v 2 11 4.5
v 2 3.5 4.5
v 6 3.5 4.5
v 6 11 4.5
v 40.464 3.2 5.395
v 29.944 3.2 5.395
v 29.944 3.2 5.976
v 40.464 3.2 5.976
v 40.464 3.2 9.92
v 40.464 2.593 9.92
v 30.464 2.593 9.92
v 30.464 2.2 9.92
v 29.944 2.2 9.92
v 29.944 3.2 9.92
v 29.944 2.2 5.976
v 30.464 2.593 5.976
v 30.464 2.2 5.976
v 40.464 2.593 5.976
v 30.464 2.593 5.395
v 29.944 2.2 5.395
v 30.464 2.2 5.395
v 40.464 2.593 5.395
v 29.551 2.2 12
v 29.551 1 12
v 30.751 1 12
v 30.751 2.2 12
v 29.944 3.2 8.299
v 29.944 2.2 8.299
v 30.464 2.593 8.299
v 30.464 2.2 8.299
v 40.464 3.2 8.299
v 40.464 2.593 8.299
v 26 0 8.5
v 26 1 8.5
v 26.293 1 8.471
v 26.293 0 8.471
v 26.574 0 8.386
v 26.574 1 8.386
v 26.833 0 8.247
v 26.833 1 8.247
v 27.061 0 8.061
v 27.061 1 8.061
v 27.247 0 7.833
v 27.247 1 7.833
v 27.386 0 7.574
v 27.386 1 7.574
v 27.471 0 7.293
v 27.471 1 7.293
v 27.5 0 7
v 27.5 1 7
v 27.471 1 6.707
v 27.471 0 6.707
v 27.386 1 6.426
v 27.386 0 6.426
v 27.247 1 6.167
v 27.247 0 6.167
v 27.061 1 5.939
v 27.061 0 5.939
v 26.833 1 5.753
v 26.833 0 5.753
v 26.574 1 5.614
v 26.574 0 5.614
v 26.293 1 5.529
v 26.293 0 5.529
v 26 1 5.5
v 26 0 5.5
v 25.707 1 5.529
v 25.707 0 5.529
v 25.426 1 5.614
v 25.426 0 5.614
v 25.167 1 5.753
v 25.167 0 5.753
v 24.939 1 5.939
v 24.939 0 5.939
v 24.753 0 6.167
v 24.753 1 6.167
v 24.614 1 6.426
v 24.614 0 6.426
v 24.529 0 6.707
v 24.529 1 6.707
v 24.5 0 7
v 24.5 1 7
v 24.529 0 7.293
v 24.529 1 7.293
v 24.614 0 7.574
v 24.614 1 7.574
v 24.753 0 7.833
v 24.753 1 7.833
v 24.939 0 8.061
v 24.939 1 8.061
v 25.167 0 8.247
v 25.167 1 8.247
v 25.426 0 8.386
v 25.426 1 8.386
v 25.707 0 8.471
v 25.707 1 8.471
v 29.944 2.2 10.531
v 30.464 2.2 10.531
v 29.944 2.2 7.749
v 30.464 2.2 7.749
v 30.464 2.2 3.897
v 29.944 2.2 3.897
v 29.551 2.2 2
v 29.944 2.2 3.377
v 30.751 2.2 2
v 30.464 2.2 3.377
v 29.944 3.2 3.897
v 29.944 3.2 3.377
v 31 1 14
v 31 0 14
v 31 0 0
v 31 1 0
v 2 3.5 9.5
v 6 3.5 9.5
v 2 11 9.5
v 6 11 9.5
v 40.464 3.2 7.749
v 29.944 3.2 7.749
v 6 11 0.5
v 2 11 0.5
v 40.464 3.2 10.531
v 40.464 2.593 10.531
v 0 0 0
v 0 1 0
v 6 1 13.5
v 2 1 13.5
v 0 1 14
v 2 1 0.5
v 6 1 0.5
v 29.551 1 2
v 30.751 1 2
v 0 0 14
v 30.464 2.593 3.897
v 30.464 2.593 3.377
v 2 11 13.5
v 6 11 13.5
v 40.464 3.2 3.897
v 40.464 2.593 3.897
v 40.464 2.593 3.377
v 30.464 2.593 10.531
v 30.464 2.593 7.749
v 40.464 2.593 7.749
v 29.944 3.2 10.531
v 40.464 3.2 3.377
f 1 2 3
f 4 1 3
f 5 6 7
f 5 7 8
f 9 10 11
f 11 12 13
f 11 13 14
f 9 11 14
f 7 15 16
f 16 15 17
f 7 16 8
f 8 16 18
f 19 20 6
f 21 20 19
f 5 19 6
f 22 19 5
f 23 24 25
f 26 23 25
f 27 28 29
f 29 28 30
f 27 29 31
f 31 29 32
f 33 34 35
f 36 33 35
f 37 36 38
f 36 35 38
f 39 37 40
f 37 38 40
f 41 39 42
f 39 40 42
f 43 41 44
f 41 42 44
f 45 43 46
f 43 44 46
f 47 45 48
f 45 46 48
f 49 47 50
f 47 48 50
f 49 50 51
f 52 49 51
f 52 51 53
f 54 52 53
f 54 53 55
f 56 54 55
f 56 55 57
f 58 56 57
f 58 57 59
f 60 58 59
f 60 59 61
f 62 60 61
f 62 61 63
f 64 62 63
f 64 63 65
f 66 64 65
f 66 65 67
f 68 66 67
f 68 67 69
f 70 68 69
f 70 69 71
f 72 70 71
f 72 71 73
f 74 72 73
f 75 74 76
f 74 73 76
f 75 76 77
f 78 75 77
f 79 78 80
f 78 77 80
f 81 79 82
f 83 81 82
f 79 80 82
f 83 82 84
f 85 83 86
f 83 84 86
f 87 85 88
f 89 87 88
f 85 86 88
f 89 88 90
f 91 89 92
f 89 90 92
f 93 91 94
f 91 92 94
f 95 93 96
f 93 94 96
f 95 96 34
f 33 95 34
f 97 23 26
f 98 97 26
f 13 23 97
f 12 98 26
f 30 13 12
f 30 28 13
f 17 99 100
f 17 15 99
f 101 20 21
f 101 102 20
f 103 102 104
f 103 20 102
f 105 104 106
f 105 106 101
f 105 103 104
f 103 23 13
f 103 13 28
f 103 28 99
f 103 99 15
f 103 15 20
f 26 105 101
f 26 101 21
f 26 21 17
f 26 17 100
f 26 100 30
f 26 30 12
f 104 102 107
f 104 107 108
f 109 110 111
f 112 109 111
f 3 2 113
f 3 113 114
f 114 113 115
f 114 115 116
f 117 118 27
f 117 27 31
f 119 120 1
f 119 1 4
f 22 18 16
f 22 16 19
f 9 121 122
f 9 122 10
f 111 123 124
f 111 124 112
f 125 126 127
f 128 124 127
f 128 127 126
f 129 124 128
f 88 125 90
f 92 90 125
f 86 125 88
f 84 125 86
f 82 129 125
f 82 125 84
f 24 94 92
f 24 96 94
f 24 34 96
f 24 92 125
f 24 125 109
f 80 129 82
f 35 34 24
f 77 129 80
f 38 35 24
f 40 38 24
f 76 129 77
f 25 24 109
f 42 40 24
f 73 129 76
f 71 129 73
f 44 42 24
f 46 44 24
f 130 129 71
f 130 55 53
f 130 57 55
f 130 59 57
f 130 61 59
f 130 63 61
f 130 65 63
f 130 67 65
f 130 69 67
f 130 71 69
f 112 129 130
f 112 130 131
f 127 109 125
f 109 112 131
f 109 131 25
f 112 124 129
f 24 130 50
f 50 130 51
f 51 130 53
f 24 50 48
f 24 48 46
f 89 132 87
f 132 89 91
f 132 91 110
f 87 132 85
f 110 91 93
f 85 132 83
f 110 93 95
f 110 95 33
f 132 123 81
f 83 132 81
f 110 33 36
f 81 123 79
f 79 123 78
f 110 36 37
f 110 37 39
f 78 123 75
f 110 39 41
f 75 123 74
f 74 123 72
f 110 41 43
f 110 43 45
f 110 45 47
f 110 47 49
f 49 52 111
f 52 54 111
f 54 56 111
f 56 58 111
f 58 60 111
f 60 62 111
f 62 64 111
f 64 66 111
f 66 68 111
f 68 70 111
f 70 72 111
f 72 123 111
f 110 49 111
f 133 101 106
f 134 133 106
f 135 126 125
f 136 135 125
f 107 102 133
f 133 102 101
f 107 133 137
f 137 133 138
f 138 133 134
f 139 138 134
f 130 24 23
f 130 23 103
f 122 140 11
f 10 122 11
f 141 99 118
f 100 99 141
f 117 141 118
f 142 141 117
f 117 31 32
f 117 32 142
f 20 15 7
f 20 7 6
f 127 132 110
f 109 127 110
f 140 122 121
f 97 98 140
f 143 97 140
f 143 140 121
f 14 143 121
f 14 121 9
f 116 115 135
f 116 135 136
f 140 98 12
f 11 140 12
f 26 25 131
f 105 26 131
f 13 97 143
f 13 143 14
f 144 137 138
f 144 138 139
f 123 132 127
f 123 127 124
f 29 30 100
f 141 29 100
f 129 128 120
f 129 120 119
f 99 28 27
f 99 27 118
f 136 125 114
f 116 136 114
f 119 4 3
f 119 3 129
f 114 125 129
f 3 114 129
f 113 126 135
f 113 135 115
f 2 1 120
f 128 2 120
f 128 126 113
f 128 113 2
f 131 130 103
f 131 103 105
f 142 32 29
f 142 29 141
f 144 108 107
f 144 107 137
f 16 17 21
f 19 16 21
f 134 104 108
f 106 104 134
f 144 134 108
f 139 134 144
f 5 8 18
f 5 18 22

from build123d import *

# Parameters (mm, degrees)
SKETCH1_W           = 31
SKETCH1_H           = 14
BOSS_EXTRUDE1_DEPTH = 1
SKETCH2_W           = 4
SKETCH2_H           = 4
BOSS_EXTRUDE2_DEPTH = 10
SKETCH3_R           = 1.5
CUT_EXTRUDE1_DEPTH  = 36.454195802
SKETCH4_W           = 4
SKETCH4_H           = 5
BOSS_EXTRUDE3_DEPTH = 2.5
SKETCH_1_W          = 1.2
SKETCH_1_H          = 10
EXTRUDE_1_DEPTH     = 1.2
SKETCH_2_W          = 0.519767639
SKETCH_2_H          = 0.519767639
SKETCH_2_H_2        = 0.580916774
SKETCH_2_H_3        = 0.550342206
SKETCH_2_H_4        = 0.61149134
EXTRUDE_2_DEPTH     = 1
SKETCH_3_W          = 0.61149134
SKETCH_3_H          = 0.60685635
SKETCH_3_W_2        = 0.550342206
SKETCH_3_W_3        = 0.580916774
SKETCH_3_W_4        = 0.519767639
EXTRUDE_3_DEPTH     = 10


with BuildPart() as part:
    # Sketch1 → Boss-Extrude1 (new body)
    with BuildSketch(Plane(origin=(0, 0, 0), x_dir=(1, 0, 0), z_dir=(0, 1, 0))):
        with Locations((15.5, -7)):
            Rectangle(SKETCH1_W, SKETCH1_H)
    extrude(amount=BOSS_EXTRUDE1_DEPTH)

    # Sketch2 → Boss-Extrude2 (add)
    with BuildSketch(Plane(origin=(0, 1, 0), x_dir=(1, 0, 0), z_dir=(0, 1, 0))):
        with Locations((4, -11.5)):
            Rectangle(SKETCH2_W, SKETCH2_H)
        with Locations((4, -2.5)):
            Rectangle(SKETCH2_W, SKETCH2_H)
    extrude(amount=BOSS_EXTRUDE2_DEPTH)

    # Sketch3 → Cut-Extrude1 (cut, through all)
    with BuildSketch(Plane(origin=(0, 1, 0), x_dir=(1, 0, 0), z_dir=(0, 1, 0))):
        with Locations(Location((26, -7, 0), (0, 0, 270))):
            Circle(SKETCH3_R)
    extrude(amount=-CUT_EXTRUDE1_DEPTH, mode=Mode.SUBTRACT)

    # Sketch4 → Boss-Extrude3 (add)
    with BuildSketch(Plane(origin=(0, 1, 0), x_dir=(1, 0, 0), z_dir=(0, 1, 0))):
        with Locations((4, -7)):
            Rectangle(SKETCH4_W, SKETCH4_H)
    extrude(amount=BOSS_EXTRUDE3_DEPTH)

    # 草图1 → 凸台-拉伸1 (add)
    with BuildSketch(Plane(origin=(0, 1, 0), x_dir=(1, 0, 0), z_dir=(0, 1, 0))):
        with Locations((30.150896117, -7)):
            Rectangle(SKETCH_1_W, SKETCH_1_H)
    extrude(amount=EXTRUDE_1_DEPTH)

    # 草图2 → 凸台-拉伸2 (add)
    with BuildSketch(Plane(origin=(0, 2.2, 0), x_dir=(1, 0, 0), z_dir=(0, 1, 0))):
        with Locations((30.20363542, -3.636797628)):
            Rectangle(SKETCH_2_W, SKETCH_2_H)
        with Locations((30.20363542, -5.685293618)):
            Rectangle(SKETCH_2_W, SKETCH_2_H_2)
        with Locations((30.20363542, -8.024247995)):
            Rectangle(SKETCH_2_W, SKETCH_2_H_3)
        with Locations((30.20363542, -10.225616821)):
            Rectangle(SKETCH_2_W, SKETCH_2_H_4)
    extrude(amount=EXTRUDE_2_DEPTH)

    # 草图3 → 凸台-拉伸3 (add)
    with BuildSketch(Plane(origin=(30.463519239, 0, 0), x_dir=(0, 0, -1), z_dir=(1, 0, 0))):
        with Locations((-10.225616821, 2.896571825)):
            Rectangle(SKETCH_3_W, SKETCH_3_H)
        with Locations((-8.024247995, 2.896571825)):
            Rectangle(SKETCH_3_W_2, SKETCH_3_H)
        with Locations((-5.685293618, 2.896571825)):
            Rectangle(SKETCH_3_W_3, SKETCH_3_H)
        with Locations((-3.636797628, 2.896571825)):
            Rectangle(SKETCH_3_W_4, SKETCH_3_H)
    extrude(amount=EXTRUDE_3_DEPTH)


solid = part.part
